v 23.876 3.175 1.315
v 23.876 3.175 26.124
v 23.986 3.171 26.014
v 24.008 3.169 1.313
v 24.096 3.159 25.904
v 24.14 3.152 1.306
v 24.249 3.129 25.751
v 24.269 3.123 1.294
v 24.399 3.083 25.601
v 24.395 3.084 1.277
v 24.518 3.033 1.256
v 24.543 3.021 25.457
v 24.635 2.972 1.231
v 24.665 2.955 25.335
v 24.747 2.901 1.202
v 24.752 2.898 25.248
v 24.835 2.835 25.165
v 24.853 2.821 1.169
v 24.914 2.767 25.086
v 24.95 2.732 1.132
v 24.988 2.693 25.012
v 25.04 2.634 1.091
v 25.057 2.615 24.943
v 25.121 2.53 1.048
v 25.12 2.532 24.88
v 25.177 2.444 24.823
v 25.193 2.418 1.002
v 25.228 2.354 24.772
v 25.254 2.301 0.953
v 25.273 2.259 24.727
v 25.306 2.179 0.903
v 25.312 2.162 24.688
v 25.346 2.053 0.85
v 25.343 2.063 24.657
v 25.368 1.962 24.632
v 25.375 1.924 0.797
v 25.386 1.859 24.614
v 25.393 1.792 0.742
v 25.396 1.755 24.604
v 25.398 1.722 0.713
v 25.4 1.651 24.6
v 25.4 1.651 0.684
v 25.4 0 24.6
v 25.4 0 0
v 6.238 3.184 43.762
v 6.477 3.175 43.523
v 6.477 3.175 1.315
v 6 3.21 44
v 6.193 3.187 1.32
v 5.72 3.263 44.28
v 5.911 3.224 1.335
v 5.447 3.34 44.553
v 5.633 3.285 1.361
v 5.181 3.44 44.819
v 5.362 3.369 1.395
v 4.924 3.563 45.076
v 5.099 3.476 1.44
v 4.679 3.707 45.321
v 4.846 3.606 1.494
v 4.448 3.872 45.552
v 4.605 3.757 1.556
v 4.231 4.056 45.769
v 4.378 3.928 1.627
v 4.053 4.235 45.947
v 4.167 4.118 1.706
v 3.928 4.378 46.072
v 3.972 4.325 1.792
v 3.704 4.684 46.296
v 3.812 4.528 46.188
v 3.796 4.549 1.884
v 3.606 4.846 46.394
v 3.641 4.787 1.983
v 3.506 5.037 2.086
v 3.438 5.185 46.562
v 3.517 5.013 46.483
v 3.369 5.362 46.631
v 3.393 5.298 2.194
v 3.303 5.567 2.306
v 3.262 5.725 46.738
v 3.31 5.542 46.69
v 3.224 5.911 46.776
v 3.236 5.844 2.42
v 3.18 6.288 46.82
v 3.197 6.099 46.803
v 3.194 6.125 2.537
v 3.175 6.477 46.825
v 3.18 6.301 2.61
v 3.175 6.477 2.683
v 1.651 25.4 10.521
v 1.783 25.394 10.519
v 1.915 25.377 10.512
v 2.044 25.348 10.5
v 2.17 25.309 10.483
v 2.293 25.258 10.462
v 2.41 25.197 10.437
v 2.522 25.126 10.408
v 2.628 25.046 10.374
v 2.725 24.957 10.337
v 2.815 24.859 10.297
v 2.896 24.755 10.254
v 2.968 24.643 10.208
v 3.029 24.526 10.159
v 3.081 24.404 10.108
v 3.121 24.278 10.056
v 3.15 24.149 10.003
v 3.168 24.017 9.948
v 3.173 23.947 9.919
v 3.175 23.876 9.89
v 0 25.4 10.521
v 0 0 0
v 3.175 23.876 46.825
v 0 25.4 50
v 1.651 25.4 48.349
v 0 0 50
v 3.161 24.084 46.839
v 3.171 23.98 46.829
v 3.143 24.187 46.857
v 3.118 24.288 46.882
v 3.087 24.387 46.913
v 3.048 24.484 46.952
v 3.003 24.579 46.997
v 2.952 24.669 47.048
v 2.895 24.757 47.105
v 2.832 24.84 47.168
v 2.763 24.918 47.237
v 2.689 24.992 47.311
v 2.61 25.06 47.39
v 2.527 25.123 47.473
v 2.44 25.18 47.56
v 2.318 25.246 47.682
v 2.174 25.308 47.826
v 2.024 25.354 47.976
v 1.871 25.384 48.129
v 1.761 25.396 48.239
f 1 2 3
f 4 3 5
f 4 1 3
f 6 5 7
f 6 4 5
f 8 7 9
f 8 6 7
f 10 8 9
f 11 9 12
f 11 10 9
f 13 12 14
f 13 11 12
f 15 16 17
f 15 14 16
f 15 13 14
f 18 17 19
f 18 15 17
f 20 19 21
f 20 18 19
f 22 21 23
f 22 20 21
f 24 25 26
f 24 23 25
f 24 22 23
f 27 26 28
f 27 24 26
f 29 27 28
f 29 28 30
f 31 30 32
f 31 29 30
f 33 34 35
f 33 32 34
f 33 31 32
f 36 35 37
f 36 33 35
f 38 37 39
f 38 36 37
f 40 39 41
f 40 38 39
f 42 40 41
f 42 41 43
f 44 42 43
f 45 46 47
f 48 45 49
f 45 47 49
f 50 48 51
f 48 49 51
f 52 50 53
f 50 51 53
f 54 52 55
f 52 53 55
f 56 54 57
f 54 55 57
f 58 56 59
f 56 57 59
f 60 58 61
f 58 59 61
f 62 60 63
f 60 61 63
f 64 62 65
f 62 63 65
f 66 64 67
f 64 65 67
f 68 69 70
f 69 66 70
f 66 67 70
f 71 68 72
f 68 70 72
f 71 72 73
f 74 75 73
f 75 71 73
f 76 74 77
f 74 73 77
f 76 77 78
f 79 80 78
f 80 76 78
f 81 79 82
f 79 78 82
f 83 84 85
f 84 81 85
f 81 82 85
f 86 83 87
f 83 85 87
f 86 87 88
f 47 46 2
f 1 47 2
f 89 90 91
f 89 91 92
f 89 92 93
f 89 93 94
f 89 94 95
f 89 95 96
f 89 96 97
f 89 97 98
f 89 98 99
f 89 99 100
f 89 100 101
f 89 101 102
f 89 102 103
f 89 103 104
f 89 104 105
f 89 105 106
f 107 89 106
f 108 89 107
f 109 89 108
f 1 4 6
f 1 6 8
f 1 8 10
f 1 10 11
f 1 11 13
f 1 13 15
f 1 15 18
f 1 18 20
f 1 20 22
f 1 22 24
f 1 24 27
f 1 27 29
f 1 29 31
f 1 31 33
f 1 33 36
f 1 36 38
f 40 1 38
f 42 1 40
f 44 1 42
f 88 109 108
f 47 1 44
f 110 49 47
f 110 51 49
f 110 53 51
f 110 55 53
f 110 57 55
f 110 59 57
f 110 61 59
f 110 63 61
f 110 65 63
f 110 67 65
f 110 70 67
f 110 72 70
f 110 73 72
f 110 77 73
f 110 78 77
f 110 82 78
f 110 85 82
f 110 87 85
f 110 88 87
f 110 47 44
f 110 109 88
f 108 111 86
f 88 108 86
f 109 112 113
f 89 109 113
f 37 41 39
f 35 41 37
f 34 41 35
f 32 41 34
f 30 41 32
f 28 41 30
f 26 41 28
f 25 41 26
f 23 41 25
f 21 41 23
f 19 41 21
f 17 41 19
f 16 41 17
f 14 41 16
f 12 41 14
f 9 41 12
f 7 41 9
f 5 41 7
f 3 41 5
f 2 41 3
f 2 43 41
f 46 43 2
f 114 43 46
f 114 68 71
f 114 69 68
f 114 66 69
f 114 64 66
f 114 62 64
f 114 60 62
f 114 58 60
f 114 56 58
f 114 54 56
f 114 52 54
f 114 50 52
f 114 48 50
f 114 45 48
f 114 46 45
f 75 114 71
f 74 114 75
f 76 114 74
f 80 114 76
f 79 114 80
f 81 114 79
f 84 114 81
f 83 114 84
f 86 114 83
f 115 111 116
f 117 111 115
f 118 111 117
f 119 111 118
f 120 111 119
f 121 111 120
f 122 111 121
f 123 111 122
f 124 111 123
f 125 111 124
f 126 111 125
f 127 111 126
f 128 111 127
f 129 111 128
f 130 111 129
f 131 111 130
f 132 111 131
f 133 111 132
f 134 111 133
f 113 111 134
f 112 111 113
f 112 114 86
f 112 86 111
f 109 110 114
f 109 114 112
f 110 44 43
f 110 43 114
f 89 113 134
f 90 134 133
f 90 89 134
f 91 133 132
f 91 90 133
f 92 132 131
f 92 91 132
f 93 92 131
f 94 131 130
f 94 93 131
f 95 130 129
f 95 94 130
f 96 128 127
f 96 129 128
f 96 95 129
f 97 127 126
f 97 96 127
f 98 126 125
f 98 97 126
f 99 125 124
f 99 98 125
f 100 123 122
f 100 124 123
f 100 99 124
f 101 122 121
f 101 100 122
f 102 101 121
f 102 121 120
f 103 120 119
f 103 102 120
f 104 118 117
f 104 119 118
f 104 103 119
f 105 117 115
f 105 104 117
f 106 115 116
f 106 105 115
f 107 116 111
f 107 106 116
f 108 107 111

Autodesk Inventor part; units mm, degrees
ref_plane "Start Plane" through (0, 0, 0) normal (0, 0, 1) x (1, 0, 0)
ref_plane "End Plane" through (0, 0, 50) normal (0, 0, 1) x (1, 0, 0)
sketch "Sketch" plane through (0, 0, 0) normal (0, 0, 1) x (1, 0, 0)
  line L0 (25.4, 0) -> (0, 0)
  line L1 (0, 0) -> (0, 25.4)
  line L2 (0, 25.4) -> (1.651, 25.4)
  line L3 (3.175, 23.876) -> (3.175, 6.477)
  line L4 (6.477, 3.175) -> (23.876, 3.175)
  line L5 (25.4, 1.651) -> (25.4, 0)
  line L6 (0, -11.0414) -> (0, 31.5385) construction
  line L7 (-11.0414, 0) -> (31.5385, 0) construction
  arc A0 (3.175, 6.477) -> (6.477, 3.175) centre (6.477, 6.477) ccw
  arc A1 (3.175, 23.876) -> (1.651, 25.4) centre (1.651, 23.876) ccw
  arc A2 (25.4, 1.651) -> (23.876, 3.175) centre (23.876, 1.651) ccw
  line L8 (0, 40.0545) -> (0, -19.5574) construction
  line L9 (-19.5574, 0) -> (40.0545, 0) construction
  point P0 (3.175, 25.4)
  point P1 (3.175, 3.175)
  point P2 (25.4, 3.175)
  dimension "d0" = 25.4
  dimension "d1" = 25.4
  dimension "d2" = 3.175
  dimension "d3" = 3.175
  dimension "d10" = 0
  dimension "d11" = 0
  dimension "d14" = 3.302
  dimension "d15" = 1.524
extrude "Body" add sketch "Sketch" along normal up to surface (50 mm away) from surface at 0
sketch "Sketch3" plane through (0, 0, 0) normal (0, 0, 1) x (1, 0, 0)
  line L0 (0, 0) -> (10, 0)
ref_plane "Work Plane3" through (0, 0, 0) normal (0, -1, 0) x (1, 0, 0)
ref_plane "Work Plane4" through (0, 12.7, 50) normal (0.7071, 0, 0.7071) x (0.7071, 0, -0.7071)
split "Split1" plane through (0, 12.7, 50) removes the side toward (0.7071, 0, 0.7071)
ref_plane "Work Plane5" through (12.7, 0, 0) normal (0, 0.3827, -0.9239) x (1, 0, 0)
split "Split2" plane through (12.7, 0, 0) removes the side toward (0, 0.3827, -0.9239)
sketch "Sketch4" plane through (0, 0, 0) normal (0, -1, 0) x (1, 0, 0)
  line L0 (-2, 0) -> (12, 0) projected
  line L1 (-2, 50) -> (12, 50) projected
  dimension "d17" = 50
equation "\"d0\" = G_H"
equation "\"d1\" = G_H"
equation "\"d2\" = G_T"
equation "\"d3\" = G_T"
equation "\"d14\" = G_IR"
equation "\"d15\" = G_ER"
equation "\"d4\" = G_L"
equation "\"G_H\" = 25.4"
equation "\"G_T\" = 3.175"
equation "\"G_ER\" = 1.524"
equation "\"G_IR\" = 3.302"
equation "\"G_L\" = d17"
equation "\"ex\" = 0"
equation "\"G_OFFSET_START\" = 0"
equation "\"G_OFFSET_END\" = 0"
equation "\"d13\" = G_OFFSET_END + B_L"
equation "\"B_L\" = 50"
properties part number "AISC - L 1 x 1 x 1/8 - 1.969" material "Steel, Mild"
